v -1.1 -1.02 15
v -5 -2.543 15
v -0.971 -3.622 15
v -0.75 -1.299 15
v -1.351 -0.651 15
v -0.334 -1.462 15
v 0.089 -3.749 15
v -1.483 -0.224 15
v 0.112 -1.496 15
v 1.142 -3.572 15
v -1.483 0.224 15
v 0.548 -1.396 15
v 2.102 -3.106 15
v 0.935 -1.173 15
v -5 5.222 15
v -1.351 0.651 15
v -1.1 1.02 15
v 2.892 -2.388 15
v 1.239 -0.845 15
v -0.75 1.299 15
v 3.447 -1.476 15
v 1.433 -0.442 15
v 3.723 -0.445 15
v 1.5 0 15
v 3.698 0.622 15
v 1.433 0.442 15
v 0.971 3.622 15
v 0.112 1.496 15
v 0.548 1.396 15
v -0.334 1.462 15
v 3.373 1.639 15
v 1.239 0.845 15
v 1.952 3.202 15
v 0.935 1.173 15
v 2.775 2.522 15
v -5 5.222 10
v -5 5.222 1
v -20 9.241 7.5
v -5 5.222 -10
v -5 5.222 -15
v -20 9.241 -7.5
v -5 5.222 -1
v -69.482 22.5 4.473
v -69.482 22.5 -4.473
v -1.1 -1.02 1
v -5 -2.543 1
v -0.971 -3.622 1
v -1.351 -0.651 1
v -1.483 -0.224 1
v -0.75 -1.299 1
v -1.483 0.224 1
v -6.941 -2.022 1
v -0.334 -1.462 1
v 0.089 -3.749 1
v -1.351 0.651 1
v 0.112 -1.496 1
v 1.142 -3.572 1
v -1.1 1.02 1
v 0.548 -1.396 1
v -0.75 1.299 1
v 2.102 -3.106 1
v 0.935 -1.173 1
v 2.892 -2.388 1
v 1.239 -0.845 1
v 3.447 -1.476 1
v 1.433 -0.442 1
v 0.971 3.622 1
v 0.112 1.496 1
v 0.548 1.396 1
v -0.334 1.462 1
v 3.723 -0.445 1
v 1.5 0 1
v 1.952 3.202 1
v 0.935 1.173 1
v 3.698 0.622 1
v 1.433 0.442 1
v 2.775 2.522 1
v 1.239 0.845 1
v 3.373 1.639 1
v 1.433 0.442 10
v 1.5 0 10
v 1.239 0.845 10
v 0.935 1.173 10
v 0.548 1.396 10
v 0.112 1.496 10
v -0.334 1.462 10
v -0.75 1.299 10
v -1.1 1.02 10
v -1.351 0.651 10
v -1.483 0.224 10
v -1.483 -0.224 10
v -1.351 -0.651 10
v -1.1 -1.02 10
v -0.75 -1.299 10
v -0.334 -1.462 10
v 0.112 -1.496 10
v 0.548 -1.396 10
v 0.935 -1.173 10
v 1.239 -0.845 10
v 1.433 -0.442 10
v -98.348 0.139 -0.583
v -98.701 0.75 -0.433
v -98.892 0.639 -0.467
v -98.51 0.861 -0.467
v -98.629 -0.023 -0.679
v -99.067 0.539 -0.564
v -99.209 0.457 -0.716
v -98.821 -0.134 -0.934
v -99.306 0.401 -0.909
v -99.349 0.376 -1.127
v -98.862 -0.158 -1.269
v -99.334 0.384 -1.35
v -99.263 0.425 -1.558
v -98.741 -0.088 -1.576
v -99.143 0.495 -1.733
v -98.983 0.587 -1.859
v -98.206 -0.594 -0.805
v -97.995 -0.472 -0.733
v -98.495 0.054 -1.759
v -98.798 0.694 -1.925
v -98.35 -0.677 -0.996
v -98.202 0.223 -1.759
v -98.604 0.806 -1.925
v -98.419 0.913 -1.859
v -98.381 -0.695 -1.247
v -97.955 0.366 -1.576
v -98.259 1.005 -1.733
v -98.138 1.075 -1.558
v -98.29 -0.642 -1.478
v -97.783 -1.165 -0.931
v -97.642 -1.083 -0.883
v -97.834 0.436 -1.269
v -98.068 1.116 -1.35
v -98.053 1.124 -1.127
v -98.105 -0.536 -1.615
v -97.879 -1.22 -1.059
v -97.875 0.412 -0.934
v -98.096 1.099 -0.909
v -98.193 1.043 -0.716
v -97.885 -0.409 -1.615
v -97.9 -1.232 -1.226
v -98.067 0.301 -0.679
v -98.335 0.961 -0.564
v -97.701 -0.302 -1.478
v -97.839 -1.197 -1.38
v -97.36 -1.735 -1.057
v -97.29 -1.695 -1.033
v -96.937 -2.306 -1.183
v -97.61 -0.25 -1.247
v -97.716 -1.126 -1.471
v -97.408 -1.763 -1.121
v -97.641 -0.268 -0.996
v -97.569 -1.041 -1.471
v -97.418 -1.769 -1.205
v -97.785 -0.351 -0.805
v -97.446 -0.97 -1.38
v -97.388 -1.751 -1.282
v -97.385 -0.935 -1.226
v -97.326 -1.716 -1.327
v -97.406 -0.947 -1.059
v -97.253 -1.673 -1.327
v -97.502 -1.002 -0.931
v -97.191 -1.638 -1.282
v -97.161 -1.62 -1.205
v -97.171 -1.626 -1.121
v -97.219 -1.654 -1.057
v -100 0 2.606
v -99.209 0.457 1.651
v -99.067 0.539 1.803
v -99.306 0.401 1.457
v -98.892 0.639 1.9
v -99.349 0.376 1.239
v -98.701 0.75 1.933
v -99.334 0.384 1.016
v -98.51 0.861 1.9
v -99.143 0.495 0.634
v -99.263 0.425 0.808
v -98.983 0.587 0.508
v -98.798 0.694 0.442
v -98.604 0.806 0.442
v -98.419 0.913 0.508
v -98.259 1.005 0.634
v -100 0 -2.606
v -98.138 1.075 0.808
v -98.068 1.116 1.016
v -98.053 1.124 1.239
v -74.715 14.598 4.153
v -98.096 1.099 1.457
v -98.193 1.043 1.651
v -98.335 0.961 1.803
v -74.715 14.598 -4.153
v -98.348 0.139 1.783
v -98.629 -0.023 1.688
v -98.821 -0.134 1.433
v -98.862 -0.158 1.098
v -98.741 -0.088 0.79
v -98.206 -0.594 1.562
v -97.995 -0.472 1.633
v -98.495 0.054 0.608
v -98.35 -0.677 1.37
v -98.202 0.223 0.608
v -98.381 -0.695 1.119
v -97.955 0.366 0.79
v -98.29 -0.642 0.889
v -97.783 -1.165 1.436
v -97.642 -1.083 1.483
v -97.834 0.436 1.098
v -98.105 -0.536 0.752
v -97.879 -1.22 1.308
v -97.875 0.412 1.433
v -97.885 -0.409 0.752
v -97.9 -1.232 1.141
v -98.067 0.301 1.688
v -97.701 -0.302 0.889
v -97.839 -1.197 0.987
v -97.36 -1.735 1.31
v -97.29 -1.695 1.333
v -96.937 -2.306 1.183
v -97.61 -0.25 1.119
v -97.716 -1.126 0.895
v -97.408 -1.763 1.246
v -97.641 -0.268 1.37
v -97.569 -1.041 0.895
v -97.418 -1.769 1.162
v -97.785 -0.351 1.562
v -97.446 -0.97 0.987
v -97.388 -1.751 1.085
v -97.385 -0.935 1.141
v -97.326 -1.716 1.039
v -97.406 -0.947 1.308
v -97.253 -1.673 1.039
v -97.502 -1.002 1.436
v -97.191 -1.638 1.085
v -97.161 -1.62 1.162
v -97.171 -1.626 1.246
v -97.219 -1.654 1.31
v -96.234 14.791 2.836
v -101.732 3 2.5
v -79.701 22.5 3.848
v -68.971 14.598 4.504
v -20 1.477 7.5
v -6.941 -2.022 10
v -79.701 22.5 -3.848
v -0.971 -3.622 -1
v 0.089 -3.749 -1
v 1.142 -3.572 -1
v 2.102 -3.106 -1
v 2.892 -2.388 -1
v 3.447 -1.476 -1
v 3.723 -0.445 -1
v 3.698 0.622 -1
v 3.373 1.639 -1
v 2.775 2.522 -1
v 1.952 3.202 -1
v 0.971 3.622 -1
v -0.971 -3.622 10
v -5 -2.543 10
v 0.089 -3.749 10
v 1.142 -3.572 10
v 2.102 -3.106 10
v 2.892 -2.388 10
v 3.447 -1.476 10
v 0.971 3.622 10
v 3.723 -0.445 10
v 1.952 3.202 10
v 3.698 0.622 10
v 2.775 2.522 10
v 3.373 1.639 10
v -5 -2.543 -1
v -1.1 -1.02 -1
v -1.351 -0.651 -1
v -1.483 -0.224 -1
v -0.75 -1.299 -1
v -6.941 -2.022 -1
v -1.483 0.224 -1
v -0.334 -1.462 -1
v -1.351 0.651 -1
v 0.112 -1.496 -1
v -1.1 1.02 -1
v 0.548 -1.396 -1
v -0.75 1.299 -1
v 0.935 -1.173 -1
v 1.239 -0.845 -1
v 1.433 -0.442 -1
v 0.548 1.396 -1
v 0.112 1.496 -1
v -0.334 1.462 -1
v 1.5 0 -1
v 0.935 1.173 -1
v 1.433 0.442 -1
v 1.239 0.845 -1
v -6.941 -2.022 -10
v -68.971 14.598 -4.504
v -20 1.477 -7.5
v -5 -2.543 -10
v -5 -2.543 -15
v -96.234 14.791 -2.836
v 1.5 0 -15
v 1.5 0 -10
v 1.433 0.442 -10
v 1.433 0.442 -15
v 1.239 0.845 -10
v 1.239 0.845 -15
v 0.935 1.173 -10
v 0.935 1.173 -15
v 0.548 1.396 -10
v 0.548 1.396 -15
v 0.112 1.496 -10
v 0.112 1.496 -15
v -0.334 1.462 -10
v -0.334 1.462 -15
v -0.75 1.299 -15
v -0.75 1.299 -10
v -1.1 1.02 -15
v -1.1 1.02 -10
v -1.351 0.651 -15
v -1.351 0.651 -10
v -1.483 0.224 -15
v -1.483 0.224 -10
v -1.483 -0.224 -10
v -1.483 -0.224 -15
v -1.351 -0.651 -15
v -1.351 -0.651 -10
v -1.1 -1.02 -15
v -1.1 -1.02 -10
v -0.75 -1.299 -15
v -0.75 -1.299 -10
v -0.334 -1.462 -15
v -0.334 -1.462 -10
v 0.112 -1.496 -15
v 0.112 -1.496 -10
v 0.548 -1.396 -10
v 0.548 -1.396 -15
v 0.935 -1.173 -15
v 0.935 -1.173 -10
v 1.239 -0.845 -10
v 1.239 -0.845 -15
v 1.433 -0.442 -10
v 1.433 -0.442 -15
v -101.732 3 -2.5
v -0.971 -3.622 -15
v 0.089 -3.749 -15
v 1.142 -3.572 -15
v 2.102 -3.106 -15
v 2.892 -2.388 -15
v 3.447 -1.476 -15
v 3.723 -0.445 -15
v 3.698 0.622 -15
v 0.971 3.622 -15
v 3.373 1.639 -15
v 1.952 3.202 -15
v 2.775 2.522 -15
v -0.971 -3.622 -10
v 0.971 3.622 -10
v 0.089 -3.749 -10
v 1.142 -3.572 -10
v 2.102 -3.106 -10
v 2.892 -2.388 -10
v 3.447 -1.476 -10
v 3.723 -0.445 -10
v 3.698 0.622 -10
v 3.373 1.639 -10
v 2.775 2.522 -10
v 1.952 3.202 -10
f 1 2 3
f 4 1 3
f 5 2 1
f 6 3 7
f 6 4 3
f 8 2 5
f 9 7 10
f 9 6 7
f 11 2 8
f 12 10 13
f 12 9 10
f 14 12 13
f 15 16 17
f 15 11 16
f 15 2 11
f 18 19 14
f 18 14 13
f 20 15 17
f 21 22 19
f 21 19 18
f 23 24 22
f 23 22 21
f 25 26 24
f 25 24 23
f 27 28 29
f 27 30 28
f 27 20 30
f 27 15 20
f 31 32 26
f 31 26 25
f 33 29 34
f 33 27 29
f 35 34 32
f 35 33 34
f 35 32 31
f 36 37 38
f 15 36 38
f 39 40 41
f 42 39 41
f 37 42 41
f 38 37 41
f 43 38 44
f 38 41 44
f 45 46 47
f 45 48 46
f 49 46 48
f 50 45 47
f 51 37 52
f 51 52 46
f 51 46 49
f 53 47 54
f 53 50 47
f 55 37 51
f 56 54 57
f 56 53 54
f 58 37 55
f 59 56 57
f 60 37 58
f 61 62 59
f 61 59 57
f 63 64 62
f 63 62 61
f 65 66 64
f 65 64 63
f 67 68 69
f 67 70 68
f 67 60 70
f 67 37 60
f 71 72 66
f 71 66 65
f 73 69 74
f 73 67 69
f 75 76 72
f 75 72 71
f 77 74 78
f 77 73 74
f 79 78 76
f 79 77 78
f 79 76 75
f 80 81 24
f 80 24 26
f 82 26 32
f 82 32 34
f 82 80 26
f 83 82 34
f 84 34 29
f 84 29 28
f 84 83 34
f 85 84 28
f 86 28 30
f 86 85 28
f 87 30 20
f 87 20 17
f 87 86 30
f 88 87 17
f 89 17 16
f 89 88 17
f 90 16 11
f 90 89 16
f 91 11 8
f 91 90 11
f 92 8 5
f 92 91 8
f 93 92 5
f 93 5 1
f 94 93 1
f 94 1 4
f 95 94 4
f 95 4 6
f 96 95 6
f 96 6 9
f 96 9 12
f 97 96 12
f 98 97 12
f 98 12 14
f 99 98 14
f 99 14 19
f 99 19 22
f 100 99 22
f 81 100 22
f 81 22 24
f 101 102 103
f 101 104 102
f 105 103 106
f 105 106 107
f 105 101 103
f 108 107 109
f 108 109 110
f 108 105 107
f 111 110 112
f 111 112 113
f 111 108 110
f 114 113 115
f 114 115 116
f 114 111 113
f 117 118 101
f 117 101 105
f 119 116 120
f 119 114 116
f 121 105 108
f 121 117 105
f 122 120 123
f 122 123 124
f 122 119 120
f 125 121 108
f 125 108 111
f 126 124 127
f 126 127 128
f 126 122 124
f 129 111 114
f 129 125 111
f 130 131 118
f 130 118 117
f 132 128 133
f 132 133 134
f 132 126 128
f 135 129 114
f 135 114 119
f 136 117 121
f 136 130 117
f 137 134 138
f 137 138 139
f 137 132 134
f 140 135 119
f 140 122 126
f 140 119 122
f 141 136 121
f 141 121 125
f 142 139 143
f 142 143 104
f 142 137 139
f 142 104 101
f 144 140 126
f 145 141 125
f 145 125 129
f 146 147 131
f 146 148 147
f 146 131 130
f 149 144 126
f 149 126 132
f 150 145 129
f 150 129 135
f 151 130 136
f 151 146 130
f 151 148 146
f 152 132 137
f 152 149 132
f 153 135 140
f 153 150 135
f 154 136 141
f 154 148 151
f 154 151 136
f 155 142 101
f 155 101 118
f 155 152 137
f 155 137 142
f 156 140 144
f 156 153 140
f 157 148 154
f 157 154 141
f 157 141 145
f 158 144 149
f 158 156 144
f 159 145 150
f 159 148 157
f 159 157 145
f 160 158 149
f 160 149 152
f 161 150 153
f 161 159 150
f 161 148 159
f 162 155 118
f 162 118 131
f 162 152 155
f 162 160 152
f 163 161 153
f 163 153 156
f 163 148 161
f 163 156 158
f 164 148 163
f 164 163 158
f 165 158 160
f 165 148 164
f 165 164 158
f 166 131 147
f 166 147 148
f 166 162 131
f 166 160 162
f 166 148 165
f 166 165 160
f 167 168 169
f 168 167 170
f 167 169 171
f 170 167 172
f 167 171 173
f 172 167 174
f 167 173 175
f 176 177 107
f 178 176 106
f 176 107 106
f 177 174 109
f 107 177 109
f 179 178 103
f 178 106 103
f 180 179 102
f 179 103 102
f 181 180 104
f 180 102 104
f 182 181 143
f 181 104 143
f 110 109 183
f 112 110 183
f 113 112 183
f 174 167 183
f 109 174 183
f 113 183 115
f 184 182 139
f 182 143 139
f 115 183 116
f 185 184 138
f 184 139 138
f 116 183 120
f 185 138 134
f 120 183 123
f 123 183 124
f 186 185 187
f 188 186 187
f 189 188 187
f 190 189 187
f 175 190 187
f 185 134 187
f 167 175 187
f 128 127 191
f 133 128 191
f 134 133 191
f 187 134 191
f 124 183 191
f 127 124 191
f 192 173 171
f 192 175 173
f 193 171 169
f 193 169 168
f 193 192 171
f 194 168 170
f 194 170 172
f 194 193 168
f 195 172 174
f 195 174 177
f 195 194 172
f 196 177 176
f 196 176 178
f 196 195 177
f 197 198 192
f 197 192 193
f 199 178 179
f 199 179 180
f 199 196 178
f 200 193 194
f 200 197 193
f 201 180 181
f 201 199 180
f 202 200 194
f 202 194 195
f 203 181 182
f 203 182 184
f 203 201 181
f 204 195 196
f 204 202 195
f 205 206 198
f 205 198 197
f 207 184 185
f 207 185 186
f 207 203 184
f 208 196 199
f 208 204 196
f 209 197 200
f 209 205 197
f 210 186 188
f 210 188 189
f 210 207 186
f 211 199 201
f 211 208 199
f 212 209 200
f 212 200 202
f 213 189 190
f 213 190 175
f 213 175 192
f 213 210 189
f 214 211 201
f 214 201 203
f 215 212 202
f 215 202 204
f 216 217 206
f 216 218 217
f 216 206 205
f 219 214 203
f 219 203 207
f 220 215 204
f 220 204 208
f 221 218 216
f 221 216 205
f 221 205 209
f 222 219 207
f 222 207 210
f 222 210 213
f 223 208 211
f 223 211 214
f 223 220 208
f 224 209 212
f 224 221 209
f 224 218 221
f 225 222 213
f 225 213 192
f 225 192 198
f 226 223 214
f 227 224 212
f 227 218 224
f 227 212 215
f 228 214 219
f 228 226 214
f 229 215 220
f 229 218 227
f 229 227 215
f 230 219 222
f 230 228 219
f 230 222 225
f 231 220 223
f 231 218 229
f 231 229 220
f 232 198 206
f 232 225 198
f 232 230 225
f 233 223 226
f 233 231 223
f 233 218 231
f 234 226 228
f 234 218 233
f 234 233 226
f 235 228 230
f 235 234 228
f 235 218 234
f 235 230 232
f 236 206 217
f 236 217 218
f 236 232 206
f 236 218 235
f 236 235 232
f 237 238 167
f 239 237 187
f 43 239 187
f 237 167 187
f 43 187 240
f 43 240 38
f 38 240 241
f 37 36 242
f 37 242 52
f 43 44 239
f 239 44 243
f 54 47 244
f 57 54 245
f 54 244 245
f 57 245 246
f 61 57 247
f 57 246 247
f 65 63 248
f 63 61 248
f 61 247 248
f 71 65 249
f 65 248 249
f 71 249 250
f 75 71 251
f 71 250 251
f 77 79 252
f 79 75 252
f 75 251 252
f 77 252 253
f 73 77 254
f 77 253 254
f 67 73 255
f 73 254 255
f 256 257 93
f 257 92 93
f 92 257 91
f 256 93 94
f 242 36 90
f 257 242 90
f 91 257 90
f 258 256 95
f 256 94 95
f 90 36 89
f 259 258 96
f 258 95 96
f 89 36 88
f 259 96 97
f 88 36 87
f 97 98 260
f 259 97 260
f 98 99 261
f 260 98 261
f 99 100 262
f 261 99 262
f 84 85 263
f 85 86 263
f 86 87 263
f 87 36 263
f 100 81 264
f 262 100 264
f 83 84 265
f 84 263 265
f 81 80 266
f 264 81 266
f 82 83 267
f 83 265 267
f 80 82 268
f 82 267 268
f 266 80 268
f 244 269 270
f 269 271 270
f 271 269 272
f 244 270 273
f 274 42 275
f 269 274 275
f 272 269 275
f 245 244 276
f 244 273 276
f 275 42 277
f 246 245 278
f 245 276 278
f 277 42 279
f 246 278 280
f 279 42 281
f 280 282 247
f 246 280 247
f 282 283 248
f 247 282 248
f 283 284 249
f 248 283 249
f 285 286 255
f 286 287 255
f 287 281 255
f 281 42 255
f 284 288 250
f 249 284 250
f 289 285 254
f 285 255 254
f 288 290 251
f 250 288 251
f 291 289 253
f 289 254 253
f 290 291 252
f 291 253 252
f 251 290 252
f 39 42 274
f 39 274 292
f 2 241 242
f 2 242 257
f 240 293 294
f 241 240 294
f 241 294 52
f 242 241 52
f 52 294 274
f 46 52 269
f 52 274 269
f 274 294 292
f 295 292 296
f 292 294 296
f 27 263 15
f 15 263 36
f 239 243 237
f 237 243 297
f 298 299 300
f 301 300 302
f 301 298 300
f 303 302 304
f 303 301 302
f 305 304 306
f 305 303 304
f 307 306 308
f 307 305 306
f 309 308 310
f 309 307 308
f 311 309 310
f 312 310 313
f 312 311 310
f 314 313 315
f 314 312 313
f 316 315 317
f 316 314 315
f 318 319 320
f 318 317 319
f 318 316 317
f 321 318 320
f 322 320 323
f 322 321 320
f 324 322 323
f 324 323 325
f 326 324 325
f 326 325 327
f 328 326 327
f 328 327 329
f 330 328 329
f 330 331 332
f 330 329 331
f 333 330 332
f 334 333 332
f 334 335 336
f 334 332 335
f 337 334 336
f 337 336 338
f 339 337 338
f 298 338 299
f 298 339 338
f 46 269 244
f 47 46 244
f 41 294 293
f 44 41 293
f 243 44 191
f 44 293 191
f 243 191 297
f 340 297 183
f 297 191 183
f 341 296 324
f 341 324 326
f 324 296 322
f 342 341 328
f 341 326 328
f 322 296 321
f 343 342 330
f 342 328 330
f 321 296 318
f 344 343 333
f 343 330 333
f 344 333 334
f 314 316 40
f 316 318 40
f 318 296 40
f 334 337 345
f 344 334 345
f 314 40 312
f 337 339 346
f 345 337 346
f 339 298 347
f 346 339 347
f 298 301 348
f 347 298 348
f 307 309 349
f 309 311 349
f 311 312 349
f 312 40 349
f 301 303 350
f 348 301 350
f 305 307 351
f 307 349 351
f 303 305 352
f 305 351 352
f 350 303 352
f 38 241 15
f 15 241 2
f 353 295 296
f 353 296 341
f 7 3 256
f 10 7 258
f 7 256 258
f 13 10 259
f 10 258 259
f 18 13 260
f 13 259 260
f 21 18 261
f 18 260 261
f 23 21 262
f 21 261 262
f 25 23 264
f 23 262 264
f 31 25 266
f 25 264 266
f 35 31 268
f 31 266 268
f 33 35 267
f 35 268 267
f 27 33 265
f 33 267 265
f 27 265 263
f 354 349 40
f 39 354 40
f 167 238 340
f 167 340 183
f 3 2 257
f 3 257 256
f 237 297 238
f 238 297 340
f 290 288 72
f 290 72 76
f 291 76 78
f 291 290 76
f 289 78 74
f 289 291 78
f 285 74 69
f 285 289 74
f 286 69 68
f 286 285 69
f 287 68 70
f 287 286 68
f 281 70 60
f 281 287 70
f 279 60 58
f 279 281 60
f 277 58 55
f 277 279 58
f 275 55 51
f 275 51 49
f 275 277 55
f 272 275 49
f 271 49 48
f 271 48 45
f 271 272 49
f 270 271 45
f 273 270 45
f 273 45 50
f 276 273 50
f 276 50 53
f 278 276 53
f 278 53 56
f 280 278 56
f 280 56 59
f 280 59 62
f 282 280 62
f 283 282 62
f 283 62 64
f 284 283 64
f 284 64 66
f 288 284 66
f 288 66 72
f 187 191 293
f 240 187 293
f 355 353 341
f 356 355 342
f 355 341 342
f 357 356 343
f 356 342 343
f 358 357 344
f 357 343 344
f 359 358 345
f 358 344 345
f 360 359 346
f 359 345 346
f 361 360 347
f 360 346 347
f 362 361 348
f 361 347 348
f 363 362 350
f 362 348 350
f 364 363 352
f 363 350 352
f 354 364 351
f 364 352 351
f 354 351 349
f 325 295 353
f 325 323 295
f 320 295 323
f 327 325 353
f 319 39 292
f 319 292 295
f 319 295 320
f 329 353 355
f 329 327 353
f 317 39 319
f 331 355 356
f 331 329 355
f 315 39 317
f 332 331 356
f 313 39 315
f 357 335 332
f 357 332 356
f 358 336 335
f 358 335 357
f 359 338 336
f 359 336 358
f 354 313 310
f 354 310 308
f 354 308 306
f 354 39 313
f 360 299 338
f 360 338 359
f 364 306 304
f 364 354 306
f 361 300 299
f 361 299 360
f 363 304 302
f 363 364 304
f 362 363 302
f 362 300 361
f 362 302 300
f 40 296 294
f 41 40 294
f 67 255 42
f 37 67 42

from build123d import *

# Parameters (mm, degrees)
BOSS_EXTRUDE2_DEPTH      = 15
BOSS_EXTRUDE2_DEPTH_BACK = 15
SKETCH3_R                = 1.5
CUT_EXTRUDE2_DEPTH       = 106.264714703
CUT_EXTRUDE2_DEPTH_BACK  = 106.264714703
SKETCH12_OUTSIDE_W       = 130.034
SKETCH12_OUTSIDE_H       = 54.552
BOSS_EXTRUDE3_DEPTH      = 15
BOSS_EXTRUDE3_DEPTH_BACK = 15
SKETCH13_R               = 1.5
CUT_EXTRUDE8_REACH       = 107.495
SKETCH16_W               = 6.181190374
SKETCH16_H               = 9
SKETCH16_W_2             = 3.75


with BuildPart() as part:
    # Sketch3 → Boss-Extrude2 (new, two sides: drawn at the far end of the back side and taken through both)
    with BuildSketch(Plane.XY.offset(-BOSS_EXTRUDE2_DEPTH_BACK)):
        with BuildLine():
            Line((0.970571419, 3.622221849), (-69.482255776, 22.5))
            Line((-69.482255776, 22.5), (-79.701126542, 22.5))
            Line((-79.701126542, 22.5), (-96.234008051, 14.790590741))
            Line((-96.234008051, 14.790590741), (-101.732050808, 3))
            Line((-101.732050808, 3), (-100, 0))
            Line((-100, 0), (-74.714962449, 14.598323237))
            Line((-74.714962449, 14.598323237), (-68.970571419, 14.598323237))
            Line((-68.970571419, 14.598323237), (-0.970571419, -3.622221849))
            ThreePointArc((-0.970571419, -3.622221849), (3.622221849, -0.970571419), (0.970571419, 3.622221849))
        make_face()
        Circle(SKETCH3_R, mode=Mode.SUBTRACT)
    extrude(amount=BOSS_EXTRUDE2_DEPTH + BOSS_EXTRUDE2_DEPTH_BACK)

    # Sketch12 outside → Cut-Extrude2 (cut, two sides: drawn at the far end of the back side and taken through both)
    with BuildSketch(Plane(origin=(0, 0, 0), x_dir=(1, 0, 0), z_dir=(0, 1, 0)).offset(-CUT_EXTRUDE2_DEPTH_BACK)):
        with Locations((-48.991, 0)):
            Rectangle(SKETCH12_OUTSIDE_W, SKETCH12_OUTSIDE_H)
        Polygon((-101.732050808, 2.5), (-101.732050808, -2.5), (-20, -7.5), (-5, -15), (-5, 15), (-20, 7.5), align=None, mode=Mode.SUBTRACT)
    extrude(amount=CUT_EXTRUDE2_DEPTH + CUT_EXTRUDE2_DEPTH_BACK, mode=Mode.SUBTRACT)

    # Sketch13 → Boss-Extrude3 (add, two sides: drawn at the far end of the back side and taken through both)
    with BuildSketch(Plane.XY.offset(-BOSS_EXTRUDE3_DEPTH_BACK)):
        with BuildLine():
            Line((-5, 5.222031639), (-5, -2.542539714))
            Line((-5, -2.542539714), (-0.970571419, -3.622221849))
            ThreePointArc((-0.970571419, -3.622221849), (3.622221849, -0.970571419), (0.970571419, 3.622221849))
            Line((0.970571419, 3.622221849), (-5, 5.222031639))
        make_face()
        Circle(SKETCH13_R, mode=Mode.SUBTRACT)
    extrude(amount=BOSS_EXTRUDE3_DEPTH + BOSS_EXTRUDE3_DEPTH_BACK)

    # Cut-Extrude8: up to this face of the body (flat: up to its plane)
    cut_extrude8_end = Plane(part.part.faces().sort_by_distance((-27.959079365, 3.60932706, 0))[0])
    # Sketch16 → Cut-Extrude8 (cut, up to the picked face)
    with BuildSketch(Plane(origin=(0.970571419, 3.622221849, 0), x_dir=(0.9659258262890683, -0.2588190451025211, 0), z_dir=(0.2588190451025211, 0.9659258262890683, 0)), mode=Mode.PRIVATE) as cut_extrude8_sk1:
        with Locations((-3.090595187, 5.5)):
            Rectangle(SKETCH16_W, SKETCH16_H)
    cut_extrude8_tool1 = split(extrude(cut_extrude8_sk1.sketch, amount=-CUT_EXTRUDE8_REACH, mode=Mode.PRIVATE), bisect_by=cut_extrude8_end, keep=Keep.BOTH, mode=Mode.PRIVATE)
    # Sketch16 → Cut-Extrude8 (cut, up to the picked face)
    with BuildSketch(Plane(origin=(0.970571419, 3.622221849, 0), x_dir=(0.9659258262890683, -0.2588190451025211, 0), z_dir=(0.2588190451025211, 0.9659258262890683, 0)), mode=Mode.PRIVATE) as cut_extrude8_sk2:
        with Locations((-3.090595187, -5.5)):
            Rectangle(SKETCH16_W, SKETCH16_H)
    cut_extrude8_tool2 = split(extrude(cut_extrude8_sk2.sketch, amount=-CUT_EXTRUDE8_REACH, mode=Mode.PRIVATE), bisect_by=cut_extrude8_end, keep=Keep.BOTH, mode=Mode.PRIVATE)
    # Sketch16 → Cut-Extrude8 (cut, up to the picked face)
    with BuildSketch(Plane(origin=(0.970571419, 3.622221849, 0), x_dir=(0.9659258262890683, -0.2588190451025211, 0), z_dir=(0.2588190451025211, 0.9659258262890683, 0)), mode=Mode.PRIVATE) as cut_extrude8_sk3:
        with Locations((1.875, -5.5)):
            Rectangle(SKETCH16_W_2, SKETCH16_H)
    cut_extrude8_tool3 = split(extrude(cut_extrude8_sk3.sketch, amount=-CUT_EXTRUDE8_REACH, mode=Mode.PRIVATE), bisect_by=cut_extrude8_end, keep=Keep.BOTH, mode=Mode.PRIVATE)
    # Sketch16 → Cut-Extrude8 (cut, up to the picked face)
    with BuildSketch(Plane(origin=(0.970571419, 3.622221849, 0), x_dir=(0.9659258262890683, -0.2588190451025211, 0), z_dir=(0.2588190451025211, 0.9659258262890683, 0)), mode=Mode.PRIVATE) as cut_extrude8_sk4:
        with Locations((1.875, 5.5)):
            Rectangle(SKETCH16_W_2, SKETCH16_H)
    cut_extrude8_tool4 = split(extrude(cut_extrude8_sk4.sketch, amount=-CUT_EXTRUDE8_REACH, mode=Mode.PRIVATE), bisect_by=cut_extrude8_end, keep=Keep.BOTH, mode=Mode.PRIVATE)
    add(cut_extrude8_tool1.solids().sort_by(Axis((-2.014714, 4.422127, -5.5), (-0.2588190451025211, -0.9659258262890683, 0)))[0], mode=Mode.SUBTRACT)
    add(cut_extrude8_tool2.solids().sort_by(Axis((-2.014714, 4.422127, 5.5), (-0.2588190451025211, -0.9659258262890683, 0)))[0], mode=Mode.SUBTRACT)
    add(cut_extrude8_tool3.solids().sort_by(Axis((2.781682, 3.136936, 5.5), (-0.2588190451025211, -0.9659258262890683, 0)))[0], mode=Mode.SUBTRACT)
    add(cut_extrude8_tool4.solids().sort_by(Axis((2.781682, 3.136936, -5.5), (-0.2588190451025211, -0.9659258262890683, 0)))[0], mode=Mode.SUBTRACT)

    # Boss-Extrude4 cone 1 section (through the dimple's axis) → Boss-Extrude4 (revolve)
    with BuildSketch(Plane(origin=(-98.700961894, 0.75, 1.183324765), x_dir=(0, 0, 1), z_dir=(0.866025404, 0.5, 0))):
        Polygon((0, 0), (0.75, 0), (0, 3.528472582), align=None)
    revolve(axis=Axis((-98.700961894, 0.75, 1.183324765), (0.5, -0.866025404, 0)))

    # Boss-Extrude4 cone 2 section (through the dimple's axis) → Boss-Extrude4 cone 2 (revolve)
    with BuildSketch(Plane(origin=(-98.700961894, 0.75, -1.183324765), x_dir=(0, 0, 1), z_dir=(0.866025404, 0.5, 0))):
        Polygon((0, 0), (0.75, 0), (0, 3.528472582), align=None)
    revolve(axis=Axis((-98.700961894, 0.75, -1.183324765), (0.5, -0.866025404, 0)))


solid = part.part
